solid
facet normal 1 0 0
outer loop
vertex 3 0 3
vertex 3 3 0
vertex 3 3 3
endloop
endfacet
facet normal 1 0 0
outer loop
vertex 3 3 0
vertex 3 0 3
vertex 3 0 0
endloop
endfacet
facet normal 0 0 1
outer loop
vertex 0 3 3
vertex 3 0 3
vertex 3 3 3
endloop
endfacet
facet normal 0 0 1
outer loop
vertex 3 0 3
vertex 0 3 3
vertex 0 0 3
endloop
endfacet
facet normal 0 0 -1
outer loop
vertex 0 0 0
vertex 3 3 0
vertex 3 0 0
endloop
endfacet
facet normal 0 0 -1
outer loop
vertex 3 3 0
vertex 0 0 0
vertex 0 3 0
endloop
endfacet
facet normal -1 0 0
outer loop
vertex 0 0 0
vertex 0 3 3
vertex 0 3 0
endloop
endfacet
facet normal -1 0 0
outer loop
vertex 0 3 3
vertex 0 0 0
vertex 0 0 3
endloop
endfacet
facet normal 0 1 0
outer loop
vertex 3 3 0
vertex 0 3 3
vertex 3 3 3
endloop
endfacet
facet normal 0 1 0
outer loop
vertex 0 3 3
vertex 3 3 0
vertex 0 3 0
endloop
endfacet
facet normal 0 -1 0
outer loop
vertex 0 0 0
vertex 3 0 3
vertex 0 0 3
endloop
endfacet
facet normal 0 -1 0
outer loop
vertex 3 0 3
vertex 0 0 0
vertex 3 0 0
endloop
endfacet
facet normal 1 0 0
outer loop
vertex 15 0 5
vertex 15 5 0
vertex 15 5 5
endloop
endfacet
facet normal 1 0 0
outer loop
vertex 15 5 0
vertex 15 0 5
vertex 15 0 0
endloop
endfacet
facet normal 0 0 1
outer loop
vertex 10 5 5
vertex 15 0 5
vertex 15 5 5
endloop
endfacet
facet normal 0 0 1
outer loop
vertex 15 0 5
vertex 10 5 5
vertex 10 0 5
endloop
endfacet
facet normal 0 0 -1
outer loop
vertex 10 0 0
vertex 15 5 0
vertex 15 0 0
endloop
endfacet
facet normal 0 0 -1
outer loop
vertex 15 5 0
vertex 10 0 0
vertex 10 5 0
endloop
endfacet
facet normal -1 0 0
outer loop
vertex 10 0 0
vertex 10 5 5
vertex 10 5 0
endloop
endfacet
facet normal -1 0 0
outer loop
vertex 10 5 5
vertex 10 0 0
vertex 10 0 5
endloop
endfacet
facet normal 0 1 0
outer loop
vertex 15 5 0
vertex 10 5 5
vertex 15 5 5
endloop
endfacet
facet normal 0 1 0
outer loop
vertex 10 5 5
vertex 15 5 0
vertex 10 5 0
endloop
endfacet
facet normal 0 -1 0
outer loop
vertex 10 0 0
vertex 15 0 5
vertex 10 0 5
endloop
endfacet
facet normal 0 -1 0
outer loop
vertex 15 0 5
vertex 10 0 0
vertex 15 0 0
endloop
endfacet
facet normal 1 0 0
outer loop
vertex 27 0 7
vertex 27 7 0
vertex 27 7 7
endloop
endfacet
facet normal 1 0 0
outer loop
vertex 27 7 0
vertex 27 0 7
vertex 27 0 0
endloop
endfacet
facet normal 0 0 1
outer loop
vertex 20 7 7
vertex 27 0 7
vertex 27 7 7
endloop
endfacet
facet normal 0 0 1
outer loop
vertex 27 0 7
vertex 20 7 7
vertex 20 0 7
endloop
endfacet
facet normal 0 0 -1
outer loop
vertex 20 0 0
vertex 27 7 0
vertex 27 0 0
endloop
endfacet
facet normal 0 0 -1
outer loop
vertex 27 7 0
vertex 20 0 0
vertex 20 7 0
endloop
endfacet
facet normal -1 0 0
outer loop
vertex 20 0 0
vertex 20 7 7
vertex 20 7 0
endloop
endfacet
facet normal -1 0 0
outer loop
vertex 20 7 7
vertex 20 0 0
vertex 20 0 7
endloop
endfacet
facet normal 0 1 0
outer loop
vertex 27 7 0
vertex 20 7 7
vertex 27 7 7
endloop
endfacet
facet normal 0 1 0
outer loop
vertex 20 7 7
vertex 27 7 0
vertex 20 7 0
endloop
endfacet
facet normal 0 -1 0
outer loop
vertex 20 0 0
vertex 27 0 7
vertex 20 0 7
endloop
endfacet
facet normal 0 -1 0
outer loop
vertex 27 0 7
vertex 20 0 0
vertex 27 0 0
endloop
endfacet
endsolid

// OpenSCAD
// Function literals: functions as values, closures over their defining
// scope, and higher-order calls.
function scaler(k) = function(v) v * k;
double = scaler(2);
apply = function(f, x) f(x);
sizes = [for (s = [1, 2, 3]) double(s)];

assert(is_function(double));
assert((function(x) x + 1)(2) == 3);

for (i = [0 : len(sizes) - 1])
    translate([i * 10, 0, 0]) cube(apply(function(x) x + 1, sizes[i]));
